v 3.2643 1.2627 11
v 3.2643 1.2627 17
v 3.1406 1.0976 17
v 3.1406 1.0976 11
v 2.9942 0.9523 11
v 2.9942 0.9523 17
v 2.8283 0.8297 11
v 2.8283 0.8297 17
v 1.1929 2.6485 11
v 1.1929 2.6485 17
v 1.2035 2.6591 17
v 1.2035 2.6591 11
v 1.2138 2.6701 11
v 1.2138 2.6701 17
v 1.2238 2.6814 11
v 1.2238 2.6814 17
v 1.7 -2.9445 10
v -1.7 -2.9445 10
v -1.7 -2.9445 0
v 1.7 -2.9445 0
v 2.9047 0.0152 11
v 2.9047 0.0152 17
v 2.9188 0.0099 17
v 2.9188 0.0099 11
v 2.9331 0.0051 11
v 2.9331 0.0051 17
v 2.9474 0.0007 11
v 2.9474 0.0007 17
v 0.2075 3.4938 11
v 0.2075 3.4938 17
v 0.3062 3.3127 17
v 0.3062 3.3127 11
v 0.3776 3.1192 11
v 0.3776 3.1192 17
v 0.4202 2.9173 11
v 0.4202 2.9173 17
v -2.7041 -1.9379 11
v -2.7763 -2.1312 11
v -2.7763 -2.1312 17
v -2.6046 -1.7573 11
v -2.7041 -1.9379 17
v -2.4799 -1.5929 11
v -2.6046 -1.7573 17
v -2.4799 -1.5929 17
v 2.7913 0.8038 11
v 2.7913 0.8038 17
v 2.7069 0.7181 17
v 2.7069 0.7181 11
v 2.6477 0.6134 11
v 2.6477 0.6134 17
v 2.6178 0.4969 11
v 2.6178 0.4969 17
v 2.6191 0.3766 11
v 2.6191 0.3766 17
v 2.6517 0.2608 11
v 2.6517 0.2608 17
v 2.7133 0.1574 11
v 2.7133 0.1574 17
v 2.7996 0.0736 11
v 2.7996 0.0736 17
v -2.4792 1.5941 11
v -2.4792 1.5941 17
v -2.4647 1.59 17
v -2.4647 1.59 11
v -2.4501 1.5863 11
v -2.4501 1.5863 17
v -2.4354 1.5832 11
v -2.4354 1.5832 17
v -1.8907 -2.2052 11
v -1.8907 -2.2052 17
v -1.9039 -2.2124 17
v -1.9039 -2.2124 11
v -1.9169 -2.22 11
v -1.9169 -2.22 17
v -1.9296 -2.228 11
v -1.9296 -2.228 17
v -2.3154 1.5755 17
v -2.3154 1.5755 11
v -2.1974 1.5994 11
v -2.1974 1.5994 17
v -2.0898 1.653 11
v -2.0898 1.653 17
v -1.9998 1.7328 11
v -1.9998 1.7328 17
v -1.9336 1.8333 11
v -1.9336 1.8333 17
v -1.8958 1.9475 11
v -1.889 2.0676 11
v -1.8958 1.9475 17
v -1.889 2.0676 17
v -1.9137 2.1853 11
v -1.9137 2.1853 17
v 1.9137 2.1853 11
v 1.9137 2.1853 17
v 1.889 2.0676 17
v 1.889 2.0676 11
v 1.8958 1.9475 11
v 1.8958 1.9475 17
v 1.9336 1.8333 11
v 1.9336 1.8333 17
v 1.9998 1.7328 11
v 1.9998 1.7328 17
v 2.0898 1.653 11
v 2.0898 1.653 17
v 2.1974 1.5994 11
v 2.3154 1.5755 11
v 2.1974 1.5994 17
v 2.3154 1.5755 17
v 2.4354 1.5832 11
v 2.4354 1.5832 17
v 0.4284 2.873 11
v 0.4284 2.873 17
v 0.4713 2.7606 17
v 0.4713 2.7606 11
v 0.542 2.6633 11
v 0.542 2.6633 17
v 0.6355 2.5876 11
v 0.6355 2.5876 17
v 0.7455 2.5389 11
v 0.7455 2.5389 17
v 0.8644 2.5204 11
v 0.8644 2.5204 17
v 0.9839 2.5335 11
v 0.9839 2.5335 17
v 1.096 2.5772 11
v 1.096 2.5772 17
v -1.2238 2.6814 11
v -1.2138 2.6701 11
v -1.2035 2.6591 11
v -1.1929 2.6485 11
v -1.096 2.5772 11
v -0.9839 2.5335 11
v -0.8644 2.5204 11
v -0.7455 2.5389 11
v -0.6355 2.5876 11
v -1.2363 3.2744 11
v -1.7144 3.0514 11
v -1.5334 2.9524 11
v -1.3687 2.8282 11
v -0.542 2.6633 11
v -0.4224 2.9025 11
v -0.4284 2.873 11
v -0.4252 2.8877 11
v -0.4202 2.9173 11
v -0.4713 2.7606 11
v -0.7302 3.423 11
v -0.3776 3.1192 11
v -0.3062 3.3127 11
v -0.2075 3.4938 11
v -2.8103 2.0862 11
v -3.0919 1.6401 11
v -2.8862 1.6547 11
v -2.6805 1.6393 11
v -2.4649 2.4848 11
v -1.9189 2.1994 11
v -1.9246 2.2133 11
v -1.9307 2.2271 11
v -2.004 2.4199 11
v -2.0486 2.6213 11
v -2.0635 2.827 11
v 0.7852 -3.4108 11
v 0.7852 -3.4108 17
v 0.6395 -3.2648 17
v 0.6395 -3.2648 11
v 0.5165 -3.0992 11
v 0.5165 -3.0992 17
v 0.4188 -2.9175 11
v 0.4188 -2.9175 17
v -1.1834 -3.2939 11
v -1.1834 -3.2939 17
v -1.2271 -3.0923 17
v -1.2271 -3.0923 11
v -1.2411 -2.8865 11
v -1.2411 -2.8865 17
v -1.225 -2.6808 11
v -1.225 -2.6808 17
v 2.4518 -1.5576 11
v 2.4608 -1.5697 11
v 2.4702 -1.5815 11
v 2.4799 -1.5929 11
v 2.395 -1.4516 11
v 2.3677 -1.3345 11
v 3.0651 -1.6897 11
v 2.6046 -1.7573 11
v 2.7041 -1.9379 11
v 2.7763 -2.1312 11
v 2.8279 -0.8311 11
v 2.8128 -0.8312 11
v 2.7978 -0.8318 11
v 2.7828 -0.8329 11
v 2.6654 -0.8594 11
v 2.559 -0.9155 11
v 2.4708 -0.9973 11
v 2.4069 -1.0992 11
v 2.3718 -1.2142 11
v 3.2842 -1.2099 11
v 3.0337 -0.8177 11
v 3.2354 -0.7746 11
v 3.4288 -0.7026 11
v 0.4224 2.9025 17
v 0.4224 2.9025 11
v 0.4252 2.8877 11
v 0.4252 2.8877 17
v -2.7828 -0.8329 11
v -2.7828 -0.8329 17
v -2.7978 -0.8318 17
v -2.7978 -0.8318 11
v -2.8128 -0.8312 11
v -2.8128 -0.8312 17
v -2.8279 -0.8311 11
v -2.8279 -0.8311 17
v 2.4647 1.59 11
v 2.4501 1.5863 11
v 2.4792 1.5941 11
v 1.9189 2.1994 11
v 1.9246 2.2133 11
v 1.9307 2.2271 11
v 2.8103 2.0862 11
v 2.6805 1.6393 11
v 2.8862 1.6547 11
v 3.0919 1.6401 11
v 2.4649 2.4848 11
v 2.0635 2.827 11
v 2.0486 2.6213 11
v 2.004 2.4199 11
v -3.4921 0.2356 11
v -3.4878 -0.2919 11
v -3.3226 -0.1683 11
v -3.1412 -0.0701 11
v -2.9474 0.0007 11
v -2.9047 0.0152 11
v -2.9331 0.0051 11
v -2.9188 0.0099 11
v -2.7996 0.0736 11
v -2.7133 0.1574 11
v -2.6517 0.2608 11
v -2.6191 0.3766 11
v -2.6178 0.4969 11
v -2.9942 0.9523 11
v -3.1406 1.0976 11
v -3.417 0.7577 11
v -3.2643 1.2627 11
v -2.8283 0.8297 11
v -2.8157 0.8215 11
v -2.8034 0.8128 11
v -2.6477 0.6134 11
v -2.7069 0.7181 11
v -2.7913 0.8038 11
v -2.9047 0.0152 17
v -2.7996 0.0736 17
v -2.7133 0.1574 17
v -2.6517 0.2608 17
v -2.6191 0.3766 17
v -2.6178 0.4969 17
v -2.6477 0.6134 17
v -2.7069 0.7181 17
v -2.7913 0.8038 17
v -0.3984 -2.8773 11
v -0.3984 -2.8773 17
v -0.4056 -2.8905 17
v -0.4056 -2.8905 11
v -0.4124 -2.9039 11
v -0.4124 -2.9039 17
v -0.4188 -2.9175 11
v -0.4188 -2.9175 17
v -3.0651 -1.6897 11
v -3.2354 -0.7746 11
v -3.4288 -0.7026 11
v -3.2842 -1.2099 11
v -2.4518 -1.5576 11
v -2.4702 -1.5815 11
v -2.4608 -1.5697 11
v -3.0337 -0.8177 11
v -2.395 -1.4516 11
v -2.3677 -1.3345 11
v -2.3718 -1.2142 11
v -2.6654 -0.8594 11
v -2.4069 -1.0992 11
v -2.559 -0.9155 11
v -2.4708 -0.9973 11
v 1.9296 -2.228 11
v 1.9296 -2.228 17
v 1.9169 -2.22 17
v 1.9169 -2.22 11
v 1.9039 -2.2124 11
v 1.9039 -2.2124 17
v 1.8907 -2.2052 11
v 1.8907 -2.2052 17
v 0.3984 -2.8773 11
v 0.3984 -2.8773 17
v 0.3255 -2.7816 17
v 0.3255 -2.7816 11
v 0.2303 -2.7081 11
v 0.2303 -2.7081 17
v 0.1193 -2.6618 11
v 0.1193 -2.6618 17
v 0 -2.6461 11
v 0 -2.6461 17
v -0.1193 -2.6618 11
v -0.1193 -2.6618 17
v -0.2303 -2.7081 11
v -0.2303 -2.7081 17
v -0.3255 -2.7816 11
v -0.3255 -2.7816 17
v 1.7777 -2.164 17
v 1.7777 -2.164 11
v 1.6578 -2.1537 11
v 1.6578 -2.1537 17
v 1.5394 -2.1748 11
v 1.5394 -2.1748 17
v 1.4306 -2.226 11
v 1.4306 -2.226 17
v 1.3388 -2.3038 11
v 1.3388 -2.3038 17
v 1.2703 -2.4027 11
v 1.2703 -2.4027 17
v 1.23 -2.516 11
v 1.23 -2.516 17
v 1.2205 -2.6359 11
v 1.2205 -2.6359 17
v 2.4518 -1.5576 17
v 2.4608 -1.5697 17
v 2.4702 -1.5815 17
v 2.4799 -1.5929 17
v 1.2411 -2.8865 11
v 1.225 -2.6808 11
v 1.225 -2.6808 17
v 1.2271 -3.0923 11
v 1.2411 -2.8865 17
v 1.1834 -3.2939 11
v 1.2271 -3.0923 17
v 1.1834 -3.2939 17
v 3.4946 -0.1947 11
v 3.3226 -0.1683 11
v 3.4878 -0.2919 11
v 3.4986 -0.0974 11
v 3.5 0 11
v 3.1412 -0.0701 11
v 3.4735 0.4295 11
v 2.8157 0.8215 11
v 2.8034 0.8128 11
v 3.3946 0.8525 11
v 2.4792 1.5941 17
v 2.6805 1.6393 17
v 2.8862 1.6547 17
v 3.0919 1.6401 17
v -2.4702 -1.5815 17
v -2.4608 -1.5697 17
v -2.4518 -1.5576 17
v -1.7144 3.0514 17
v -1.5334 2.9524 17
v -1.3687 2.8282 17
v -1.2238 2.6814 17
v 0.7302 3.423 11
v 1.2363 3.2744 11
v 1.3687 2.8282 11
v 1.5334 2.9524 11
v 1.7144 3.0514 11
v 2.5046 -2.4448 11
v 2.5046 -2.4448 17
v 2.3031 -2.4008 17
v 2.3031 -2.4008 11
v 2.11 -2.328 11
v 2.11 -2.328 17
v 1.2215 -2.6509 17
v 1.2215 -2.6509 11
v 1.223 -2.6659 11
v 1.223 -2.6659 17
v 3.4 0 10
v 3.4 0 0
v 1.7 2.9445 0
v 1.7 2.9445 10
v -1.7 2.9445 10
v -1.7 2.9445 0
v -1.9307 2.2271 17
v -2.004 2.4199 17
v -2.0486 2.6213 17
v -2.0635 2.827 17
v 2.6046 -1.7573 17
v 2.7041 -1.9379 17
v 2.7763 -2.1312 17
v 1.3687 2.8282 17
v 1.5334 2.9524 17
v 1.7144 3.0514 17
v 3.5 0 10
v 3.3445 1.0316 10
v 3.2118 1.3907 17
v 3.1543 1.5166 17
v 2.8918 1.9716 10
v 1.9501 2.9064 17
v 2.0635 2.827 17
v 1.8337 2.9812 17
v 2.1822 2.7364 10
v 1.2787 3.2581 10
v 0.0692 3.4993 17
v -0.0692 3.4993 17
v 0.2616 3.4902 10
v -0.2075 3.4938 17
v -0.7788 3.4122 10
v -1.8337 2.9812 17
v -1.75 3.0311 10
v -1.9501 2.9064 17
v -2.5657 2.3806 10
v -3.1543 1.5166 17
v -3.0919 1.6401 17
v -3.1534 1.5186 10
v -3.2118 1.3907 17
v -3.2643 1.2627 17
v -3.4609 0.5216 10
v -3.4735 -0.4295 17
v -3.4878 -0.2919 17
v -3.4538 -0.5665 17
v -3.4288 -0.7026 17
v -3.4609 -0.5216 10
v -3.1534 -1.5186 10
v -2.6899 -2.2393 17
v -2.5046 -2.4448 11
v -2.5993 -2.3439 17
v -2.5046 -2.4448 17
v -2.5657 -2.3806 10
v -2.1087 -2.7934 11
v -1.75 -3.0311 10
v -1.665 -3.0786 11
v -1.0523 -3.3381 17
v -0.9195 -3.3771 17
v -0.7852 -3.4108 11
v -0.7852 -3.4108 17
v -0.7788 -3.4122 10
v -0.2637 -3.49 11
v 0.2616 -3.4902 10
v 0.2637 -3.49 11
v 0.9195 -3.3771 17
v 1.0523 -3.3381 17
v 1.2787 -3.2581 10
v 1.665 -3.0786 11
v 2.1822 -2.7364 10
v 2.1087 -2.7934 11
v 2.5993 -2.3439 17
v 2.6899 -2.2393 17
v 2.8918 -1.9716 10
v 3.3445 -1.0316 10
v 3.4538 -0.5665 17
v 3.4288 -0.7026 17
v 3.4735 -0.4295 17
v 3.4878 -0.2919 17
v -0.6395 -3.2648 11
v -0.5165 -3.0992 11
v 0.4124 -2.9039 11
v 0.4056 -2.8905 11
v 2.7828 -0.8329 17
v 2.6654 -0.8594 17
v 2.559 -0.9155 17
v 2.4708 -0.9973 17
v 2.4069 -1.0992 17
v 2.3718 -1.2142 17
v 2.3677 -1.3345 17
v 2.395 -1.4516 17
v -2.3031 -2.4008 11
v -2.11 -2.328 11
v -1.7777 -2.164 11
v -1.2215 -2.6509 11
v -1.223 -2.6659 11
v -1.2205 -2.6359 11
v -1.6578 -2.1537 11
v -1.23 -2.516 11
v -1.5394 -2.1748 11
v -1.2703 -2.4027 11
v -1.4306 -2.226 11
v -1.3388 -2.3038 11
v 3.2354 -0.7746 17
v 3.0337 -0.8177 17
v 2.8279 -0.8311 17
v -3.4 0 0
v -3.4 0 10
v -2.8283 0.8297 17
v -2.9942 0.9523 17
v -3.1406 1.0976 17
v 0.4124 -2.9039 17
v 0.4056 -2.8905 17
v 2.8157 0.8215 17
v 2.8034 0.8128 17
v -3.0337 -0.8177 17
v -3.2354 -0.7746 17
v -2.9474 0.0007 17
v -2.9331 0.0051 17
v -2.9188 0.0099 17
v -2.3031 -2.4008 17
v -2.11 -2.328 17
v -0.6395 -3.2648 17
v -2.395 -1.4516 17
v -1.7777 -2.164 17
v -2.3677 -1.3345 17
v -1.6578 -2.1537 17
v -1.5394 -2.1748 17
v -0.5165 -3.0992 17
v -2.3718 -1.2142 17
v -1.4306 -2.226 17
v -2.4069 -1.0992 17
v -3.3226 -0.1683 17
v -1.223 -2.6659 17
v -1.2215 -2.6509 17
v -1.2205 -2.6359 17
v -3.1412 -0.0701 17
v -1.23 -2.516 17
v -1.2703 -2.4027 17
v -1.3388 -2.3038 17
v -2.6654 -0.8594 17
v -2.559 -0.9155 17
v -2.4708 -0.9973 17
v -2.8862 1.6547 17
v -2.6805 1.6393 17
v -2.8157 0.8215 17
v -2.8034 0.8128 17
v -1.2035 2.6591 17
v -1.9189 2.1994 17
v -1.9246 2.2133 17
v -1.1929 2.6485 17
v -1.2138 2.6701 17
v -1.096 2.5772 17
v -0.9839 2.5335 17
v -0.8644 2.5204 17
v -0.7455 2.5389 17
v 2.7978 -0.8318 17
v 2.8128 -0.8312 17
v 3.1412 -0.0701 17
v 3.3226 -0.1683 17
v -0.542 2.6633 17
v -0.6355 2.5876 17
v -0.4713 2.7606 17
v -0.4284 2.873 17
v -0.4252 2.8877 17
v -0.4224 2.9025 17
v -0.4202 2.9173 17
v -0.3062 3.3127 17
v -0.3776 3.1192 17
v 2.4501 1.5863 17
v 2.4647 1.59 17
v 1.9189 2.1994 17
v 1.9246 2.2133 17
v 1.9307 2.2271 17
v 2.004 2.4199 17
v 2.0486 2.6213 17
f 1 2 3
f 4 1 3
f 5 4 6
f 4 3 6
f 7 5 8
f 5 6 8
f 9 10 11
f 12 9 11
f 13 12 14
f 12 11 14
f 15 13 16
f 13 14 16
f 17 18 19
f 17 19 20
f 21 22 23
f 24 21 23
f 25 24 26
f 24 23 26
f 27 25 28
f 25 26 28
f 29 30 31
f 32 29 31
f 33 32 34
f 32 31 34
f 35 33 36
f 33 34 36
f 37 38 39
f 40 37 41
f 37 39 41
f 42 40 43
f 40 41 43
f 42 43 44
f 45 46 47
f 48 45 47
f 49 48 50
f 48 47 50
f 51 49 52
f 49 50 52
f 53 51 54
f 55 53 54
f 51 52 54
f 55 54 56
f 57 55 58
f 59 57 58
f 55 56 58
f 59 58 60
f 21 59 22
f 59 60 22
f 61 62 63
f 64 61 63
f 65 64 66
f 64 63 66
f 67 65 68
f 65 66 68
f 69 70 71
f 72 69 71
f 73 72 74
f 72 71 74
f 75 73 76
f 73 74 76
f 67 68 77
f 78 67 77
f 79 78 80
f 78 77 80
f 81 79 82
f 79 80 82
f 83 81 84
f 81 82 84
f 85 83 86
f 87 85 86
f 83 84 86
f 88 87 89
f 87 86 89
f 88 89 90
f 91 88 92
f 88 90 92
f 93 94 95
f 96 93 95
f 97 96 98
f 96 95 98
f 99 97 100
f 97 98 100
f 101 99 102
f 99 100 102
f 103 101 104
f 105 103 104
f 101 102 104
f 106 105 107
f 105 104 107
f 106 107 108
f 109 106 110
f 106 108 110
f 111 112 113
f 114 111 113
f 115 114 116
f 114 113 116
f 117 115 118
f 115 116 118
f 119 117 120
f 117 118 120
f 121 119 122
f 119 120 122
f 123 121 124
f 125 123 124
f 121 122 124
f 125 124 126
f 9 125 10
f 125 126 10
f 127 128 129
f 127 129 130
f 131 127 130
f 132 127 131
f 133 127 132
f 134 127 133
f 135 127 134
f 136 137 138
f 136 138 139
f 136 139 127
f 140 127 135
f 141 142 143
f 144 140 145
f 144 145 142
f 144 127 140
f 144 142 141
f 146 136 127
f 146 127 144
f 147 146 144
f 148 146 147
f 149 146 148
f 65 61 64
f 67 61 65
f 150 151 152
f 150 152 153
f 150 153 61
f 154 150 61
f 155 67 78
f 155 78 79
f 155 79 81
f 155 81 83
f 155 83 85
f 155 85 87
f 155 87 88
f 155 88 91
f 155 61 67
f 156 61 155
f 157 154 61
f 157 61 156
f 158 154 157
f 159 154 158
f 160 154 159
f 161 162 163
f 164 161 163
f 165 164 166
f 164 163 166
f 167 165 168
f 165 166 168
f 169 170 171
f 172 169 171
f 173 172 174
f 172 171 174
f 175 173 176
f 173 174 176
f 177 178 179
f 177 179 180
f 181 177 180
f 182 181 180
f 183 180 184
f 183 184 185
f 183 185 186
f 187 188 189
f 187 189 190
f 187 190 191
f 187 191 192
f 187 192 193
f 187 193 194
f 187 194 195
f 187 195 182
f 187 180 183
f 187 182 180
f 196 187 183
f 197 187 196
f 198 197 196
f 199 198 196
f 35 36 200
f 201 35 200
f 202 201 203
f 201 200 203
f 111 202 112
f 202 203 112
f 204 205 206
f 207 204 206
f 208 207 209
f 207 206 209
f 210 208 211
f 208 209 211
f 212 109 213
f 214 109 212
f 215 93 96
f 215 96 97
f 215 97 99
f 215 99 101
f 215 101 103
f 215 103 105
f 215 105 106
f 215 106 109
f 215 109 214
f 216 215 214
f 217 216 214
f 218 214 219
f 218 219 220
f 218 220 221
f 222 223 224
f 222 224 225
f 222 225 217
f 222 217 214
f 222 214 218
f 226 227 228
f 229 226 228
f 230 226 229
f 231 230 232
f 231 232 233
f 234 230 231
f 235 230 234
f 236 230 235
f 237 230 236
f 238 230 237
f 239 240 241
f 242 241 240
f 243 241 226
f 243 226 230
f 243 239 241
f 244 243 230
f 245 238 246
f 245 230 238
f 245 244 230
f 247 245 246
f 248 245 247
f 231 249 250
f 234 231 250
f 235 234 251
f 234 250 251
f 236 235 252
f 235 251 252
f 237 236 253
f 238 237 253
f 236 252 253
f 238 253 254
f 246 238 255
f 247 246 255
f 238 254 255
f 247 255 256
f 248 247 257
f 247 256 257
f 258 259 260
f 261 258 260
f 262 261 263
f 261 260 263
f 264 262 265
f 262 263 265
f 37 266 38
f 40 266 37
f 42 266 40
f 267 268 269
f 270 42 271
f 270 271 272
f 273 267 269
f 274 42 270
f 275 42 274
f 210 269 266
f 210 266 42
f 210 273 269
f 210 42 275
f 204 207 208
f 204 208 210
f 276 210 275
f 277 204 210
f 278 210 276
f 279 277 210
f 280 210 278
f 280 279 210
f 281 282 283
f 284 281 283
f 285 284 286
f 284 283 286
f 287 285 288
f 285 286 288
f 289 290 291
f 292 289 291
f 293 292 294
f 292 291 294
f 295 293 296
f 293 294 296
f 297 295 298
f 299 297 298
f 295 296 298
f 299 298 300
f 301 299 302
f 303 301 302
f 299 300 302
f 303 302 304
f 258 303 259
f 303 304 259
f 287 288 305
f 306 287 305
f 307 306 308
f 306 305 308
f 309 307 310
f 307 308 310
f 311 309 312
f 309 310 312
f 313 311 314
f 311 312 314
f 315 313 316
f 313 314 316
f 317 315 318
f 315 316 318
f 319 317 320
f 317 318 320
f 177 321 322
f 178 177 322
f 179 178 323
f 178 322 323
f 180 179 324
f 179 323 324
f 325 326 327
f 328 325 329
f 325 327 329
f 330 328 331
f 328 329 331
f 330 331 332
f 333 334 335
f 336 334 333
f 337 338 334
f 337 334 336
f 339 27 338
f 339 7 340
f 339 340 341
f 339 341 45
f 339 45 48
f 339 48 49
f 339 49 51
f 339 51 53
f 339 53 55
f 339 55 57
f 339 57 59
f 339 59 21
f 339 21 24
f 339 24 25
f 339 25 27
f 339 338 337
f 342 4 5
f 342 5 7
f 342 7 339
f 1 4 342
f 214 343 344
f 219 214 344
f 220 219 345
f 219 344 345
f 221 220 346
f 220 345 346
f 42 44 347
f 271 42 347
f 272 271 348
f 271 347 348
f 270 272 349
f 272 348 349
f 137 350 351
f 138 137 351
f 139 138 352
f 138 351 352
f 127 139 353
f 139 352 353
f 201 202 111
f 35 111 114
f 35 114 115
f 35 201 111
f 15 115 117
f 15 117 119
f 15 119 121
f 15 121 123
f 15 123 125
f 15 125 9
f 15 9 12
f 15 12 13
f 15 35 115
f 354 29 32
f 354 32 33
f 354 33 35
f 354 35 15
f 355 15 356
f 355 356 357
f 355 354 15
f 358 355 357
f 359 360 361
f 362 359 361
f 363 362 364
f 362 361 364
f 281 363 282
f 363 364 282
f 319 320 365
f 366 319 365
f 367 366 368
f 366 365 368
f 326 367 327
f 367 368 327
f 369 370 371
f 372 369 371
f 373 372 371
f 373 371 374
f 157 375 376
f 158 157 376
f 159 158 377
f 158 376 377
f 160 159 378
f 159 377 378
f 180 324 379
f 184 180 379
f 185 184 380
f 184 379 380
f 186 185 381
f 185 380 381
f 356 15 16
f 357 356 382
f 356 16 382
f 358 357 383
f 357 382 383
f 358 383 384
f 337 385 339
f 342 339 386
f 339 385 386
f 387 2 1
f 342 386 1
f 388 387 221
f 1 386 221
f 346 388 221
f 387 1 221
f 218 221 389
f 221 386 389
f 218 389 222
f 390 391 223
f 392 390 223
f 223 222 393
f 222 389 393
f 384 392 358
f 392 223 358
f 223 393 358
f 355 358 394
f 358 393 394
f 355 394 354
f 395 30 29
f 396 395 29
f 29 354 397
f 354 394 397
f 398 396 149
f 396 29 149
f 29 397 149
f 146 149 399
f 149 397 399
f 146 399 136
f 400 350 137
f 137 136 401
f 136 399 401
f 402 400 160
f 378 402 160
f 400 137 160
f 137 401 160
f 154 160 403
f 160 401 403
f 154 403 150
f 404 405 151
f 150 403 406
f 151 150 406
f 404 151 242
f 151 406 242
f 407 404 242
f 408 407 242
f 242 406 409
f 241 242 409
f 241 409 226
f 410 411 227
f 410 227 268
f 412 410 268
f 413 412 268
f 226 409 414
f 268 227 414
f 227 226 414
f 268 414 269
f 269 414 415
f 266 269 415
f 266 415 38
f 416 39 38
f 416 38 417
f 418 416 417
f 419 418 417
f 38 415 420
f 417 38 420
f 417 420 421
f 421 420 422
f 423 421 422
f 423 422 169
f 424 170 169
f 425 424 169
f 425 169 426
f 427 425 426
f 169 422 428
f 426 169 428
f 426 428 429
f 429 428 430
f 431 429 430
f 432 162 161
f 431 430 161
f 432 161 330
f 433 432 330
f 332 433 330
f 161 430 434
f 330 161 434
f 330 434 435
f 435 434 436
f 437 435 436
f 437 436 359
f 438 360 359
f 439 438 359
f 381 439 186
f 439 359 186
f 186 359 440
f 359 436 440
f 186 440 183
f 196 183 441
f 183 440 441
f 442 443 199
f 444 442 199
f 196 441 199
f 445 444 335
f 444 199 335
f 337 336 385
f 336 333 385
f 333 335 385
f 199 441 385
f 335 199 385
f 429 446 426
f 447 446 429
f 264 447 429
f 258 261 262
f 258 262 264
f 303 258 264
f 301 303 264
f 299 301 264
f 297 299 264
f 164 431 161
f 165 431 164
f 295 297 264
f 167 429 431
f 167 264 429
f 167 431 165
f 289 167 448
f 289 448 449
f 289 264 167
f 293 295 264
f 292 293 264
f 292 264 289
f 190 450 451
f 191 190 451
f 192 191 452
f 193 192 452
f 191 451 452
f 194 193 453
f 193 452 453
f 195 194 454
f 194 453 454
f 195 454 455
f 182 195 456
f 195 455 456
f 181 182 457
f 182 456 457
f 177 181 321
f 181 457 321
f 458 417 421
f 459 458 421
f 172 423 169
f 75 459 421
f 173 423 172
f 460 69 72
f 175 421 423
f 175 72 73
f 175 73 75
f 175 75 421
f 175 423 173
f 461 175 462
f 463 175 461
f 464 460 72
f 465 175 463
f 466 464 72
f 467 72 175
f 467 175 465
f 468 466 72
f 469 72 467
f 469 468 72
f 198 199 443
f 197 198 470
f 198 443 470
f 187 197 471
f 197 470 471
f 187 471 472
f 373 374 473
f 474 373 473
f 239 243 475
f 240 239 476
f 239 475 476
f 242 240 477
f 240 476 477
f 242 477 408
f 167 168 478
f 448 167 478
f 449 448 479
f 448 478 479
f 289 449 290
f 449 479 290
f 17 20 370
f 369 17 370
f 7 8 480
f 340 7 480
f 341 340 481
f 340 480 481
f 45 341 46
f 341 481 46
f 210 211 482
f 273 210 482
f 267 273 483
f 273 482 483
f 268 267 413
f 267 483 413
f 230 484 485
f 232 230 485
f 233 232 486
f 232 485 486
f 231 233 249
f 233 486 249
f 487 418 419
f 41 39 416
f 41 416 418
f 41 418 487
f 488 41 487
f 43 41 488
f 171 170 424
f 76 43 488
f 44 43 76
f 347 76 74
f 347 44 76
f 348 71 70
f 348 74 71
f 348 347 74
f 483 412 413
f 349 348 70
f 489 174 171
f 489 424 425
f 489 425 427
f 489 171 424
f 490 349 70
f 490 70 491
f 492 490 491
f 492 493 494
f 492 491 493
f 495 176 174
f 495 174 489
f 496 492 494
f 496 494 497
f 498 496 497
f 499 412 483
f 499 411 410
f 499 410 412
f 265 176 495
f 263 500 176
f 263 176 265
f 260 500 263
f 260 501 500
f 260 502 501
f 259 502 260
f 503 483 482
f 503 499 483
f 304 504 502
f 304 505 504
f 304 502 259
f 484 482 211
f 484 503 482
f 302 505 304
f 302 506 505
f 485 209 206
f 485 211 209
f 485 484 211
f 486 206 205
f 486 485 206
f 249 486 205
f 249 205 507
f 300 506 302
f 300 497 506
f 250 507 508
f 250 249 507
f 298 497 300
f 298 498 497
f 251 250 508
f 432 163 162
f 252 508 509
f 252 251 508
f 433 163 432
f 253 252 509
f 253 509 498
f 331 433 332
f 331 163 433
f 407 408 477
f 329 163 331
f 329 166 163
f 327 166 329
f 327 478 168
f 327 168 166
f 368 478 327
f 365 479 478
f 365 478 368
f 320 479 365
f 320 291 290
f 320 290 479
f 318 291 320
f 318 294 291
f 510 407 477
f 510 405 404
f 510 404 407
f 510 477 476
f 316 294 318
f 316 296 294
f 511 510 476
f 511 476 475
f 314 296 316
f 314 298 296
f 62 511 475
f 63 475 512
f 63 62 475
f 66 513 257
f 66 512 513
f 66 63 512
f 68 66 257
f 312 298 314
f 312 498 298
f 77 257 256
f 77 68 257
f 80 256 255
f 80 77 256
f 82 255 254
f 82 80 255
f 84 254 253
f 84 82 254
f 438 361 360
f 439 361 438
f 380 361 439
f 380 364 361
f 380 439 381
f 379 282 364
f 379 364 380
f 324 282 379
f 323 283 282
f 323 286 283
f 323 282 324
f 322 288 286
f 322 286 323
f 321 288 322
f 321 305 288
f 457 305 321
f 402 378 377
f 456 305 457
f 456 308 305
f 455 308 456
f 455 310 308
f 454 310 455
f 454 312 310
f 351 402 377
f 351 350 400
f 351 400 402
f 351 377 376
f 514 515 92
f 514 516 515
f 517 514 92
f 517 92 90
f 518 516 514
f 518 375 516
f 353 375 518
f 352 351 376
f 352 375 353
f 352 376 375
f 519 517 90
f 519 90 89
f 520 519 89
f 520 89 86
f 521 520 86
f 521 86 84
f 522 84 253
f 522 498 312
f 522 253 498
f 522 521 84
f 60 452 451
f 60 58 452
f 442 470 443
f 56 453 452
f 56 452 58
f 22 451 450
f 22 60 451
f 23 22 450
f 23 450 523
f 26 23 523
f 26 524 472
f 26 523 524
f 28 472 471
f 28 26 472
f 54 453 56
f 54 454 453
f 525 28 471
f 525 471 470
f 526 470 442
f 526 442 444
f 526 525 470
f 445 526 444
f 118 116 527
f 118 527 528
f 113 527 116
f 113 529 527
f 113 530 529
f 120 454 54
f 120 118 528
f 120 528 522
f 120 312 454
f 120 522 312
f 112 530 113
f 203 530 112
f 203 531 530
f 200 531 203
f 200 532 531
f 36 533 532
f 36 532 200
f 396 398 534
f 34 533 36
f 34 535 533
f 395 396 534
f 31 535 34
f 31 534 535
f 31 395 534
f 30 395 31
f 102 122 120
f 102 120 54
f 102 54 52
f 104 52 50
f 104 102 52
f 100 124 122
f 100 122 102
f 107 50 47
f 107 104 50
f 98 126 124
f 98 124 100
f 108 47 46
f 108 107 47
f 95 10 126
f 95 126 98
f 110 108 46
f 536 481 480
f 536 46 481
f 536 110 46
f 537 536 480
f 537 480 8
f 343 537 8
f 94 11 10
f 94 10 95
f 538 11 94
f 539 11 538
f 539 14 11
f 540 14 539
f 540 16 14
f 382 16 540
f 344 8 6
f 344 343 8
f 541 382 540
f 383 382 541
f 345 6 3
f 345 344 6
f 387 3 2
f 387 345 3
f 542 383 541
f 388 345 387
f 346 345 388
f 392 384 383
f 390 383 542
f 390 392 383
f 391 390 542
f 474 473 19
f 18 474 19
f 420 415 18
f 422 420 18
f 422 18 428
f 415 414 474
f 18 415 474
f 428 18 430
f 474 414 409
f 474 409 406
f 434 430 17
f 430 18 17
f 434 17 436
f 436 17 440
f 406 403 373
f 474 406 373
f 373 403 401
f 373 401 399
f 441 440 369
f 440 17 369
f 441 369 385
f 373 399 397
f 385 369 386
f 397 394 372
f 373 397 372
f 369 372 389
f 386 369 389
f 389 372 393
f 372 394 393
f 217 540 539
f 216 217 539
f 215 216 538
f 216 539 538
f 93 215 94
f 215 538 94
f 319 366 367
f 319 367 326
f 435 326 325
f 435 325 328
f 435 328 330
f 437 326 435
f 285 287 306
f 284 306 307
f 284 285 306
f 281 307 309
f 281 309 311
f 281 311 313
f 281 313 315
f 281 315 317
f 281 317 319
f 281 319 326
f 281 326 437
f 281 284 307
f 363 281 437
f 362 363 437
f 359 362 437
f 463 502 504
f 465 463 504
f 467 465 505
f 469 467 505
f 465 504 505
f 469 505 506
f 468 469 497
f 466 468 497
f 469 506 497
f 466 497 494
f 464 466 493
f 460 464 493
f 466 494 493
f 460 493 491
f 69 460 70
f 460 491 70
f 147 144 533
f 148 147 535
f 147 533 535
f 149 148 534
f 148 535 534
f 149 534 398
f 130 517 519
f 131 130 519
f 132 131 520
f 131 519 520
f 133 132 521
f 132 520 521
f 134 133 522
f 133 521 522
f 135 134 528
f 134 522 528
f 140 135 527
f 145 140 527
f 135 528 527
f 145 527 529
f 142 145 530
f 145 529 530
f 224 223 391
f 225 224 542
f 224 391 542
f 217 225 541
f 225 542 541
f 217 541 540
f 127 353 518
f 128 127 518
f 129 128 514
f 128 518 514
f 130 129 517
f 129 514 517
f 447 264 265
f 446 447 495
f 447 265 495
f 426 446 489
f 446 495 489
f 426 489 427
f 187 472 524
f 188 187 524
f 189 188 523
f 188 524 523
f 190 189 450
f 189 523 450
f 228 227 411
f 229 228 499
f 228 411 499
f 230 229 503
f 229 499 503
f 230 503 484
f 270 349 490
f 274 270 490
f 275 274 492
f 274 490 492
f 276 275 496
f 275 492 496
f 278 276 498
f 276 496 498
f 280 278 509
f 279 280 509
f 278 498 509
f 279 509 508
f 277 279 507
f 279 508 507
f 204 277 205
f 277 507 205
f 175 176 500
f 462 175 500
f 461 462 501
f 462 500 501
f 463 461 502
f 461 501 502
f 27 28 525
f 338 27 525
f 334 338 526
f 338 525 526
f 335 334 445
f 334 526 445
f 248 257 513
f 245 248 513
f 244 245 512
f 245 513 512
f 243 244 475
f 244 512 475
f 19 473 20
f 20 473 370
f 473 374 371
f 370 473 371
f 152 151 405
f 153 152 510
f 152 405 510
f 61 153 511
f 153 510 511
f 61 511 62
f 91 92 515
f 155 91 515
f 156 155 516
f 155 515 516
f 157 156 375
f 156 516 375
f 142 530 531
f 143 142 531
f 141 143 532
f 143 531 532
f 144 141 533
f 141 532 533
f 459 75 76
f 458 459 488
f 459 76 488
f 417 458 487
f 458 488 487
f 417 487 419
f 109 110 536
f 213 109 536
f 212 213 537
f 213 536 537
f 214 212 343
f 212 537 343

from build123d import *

# Parameters (mm, degrees)
BOSS_EXTRUDE1_DEPTH = 10
SKETCH2_R           = 3.5
BOSS_EXTRUDE2_DEPTH = 7
SKETCH5_OUTSIDE_W   = 12.934
SKETCH5_OUTSIDE_H   = 12.934
CUT_EXTRUDE1_DEPTH  = 6


with BuildPart() as part:
    # Sketch1 → Boss-Extrude1 (new body)
    with BuildSketch(Plane.XY):
        Polygon((3.4, 0), (1.7, 2.944486373), (-1.7, 2.944486373), (-3.4, 0), (-1.7, -2.944486373), (1.7, -2.944486373), align=None)
    extrude(amount=BOSS_EXTRUDE1_DEPTH)

    # Sketch2 → Boss-Extrude2 (add)
    with BuildSketch(Plane.XY.offset(10)):
        Circle(SKETCH2_R)
    extrude(amount=BOSS_EXTRUDE2_DEPTH)

    # Sketch5 outside → Cut-Extrude1 (cut)
    with BuildSketch(Plane.XY.offset(17)):
        Rectangle(SKETCH5_OUTSIDE_W, SKETCH5_OUTSIDE_H)
        with BuildLine():
            ThreePointArc((-1.225048855, -2.680805064), (-1.222210326, -2.658421079), (-1.220475879, -2.635924597))
            ThreePointArc((-1.220475879, -2.635924597), (-1.430570177, -2.226010646), (-1.890717348, -2.20518656))
            ThreePointArc((-1.890717348, -2.20518656), (-1.910460352, -2.216109645), (-1.929642373, -2.227990304))
            ThreePointArc((-1.929642373, -2.227990304), (-2.205665987, -2.368094557), (-2.505525497, -2.444922359))
            ThreePointArc((-2.505525497, -2.444922359), (-2.645696022, -2.292508653), (-2.776610031, -2.13207413))
            ThreePointArc((-2.776610031, -2.13207413), (-2.657889767, -1.846200494), (-2.479929318, -1.592925316))
            ThreePointArc((-2.479929318, -1.592925316), (-2.4654397, -1.575629335), (-2.451818074, -1.557641803))
            ThreePointArc((-2.451818074, -1.557641803), (-2.40694443, -1.09921469), (-2.782786513, -0.832922011))
            ThreePointArc((-2.782786513, -0.832922011), (-2.80530085, -0.831437221), (-2.827860963, -0.831061285))
            ThreePointArc((-2.827860963, -0.831061285), (-3.135812881, -0.79969485), (-3.429606999, -0.702210219))
            ThreePointArc((-3.429606999, -0.702210219), (-3.465124877, -0.498209743), (-3.488519299, -0.292466177))
            ThreePointArc((-3.488519299, -0.292466177), (-3.234090501, -0.116158991), (-2.947449745, 0.000696964))
            ThreePointArc((-2.947449745, 0.000696964), (-2.925909389, 0.00741359), (-2.904725354, 0.015181258))
            ThreePointArc((-2.904725354, 0.015181258), (-2.619130834, 0.376574163), (-2.791340622, 0.80378939))
            ThreePointArc((-2.791340622, 0.80378939), (-2.80947815, 0.817210645), (-2.828253678, 0.829723821))
            ThreePointArc((-2.828253678, 0.829723821), (-3.070361342, 1.022602322), (-3.264812511, 1.263448704))
            ThreePointArc((-3.264812511, 1.263448704), (-3.184401067, 1.454267239), (-3.092848337, 1.63999772))
            ThreePointArc((-3.092848337, 1.63999772), (-2.783490351, 1.65076217), (-2.479175704, 1.594097963))
            ThreePointArc((-2.479175704, 1.594097963), (-2.457423521, 1.588102753), (-2.435402858, 1.583184377))
            ThreePointArc((-2.435402858, 1.583184377), (-1.999761704, 1.73280338), (-1.913663807, 2.18530334))
            ThreePointArc((-1.913663807, 2.18530334), (-1.921665988, 2.206399906), (-1.930695833, 2.227077476))
            ThreePointArc((-1.930695833, 2.227077476), (-2.030091771, 2.520230481), (-2.063463119, 2.82797159))
            ThreePointArc((-2.063463119, 2.82797159), (-1.892652419, 2.945024649), (-1.715219882, 3.051773929))
            ThreePointArc((-1.715219882, 3.051773929), (-1.449151682, 2.893578006), (-1.223780893, 2.681384122))
            ThreePointArc((-1.223780893, 2.681384122), (-1.208723048, 2.664580512), (-1.192857163, 2.648537642))
            ThreePointArc((-1.192857163, 2.648537642), (-0.745482362, 2.538879767), (-0.428412254, 2.87299892))
            ThreePointArc((-0.428412254, 2.87299892), (-0.423738452, 2.895072786), (-0.420155704, 2.917349768))
            ThreePointArc((-0.420155704, 2.917349768), (-0.345282406, 3.217703271), (-0.206978766, 3.494633479))
            ThreePointArc((-0.206978766, 3.494633479), (-0.103534673, 3.499226191), (0, 3.500757541))
            ThreePointArc((0, 3.500757541), (0.103534673, 3.499226191), (0.206978766, 3.494633479))
            ThreePointArc((0.206978766, 3.494633479), (0.345282406, 3.217703271), (0.420155704, 2.917349768))
            ThreePointArc((0.420155704, 2.917349768), (0.423738452, 2.895072786), (0.428412254, 2.87299892))
            ThreePointArc((0.428412254, 2.87299892), (0.745482362, 2.538879767), (1.192857163, 2.648537642))
            ThreePointArc((1.192857163, 2.648537642), (1.208723048, 2.664580512), (1.223780893, 2.681384122))
            ThreePointArc((1.223780893, 2.681384122), (1.449151682, 2.893578006), (1.715219882, 3.051773929))
            ThreePointArc((1.715219882, 3.051773929), (1.892652419, 2.945024649), (2.063463119, 2.82797159))
            ThreePointArc((2.063463119, 2.82797159), (2.030091771, 2.520230481), (1.930695833, 2.227077476))
            ThreePointArc((1.930695833, 2.227077476), (1.921665988, 2.206399906), (1.913663807, 2.18530334))
            ThreePointArc((1.913663807, 2.18530334), (1.999761704, 1.73280338), (2.435402858, 1.583184377))
            ThreePointArc((2.435402858, 1.583184377), (2.457423521, 1.588102753), (2.479175704, 1.594097963))
            ThreePointArc((2.479175704, 1.594097963), (2.783490351, 1.65076217), (3.092848337, 1.63999772))
            ThreePointArc((3.092848337, 1.63999772), (3.184401067, 1.454267239), (3.264812511, 1.263448704))
            ThreePointArc((3.264812511, 1.263448704), (3.070361342, 1.022602322), (2.828253678, 0.829723821))
            ThreePointArc((2.828253678, 0.829723821), (2.80947815, 0.817210645), (2.791340622, 0.80378939))
            ThreePointArc((2.791340622, 0.80378939), (2.619130834, 0.376574163), (2.904725354, 0.015181258))
            ThreePointArc((2.904725354, 0.015181258), (2.925909389, 0.00741359), (2.947449745, 0.000696964))
            ThreePointArc((2.947449745, 0.000696964), (3.234090501, -0.116158991), (3.488519299, -0.292466177))
            ThreePointArc((3.488519299, -0.292466177), (3.465124877, -0.498209743), (3.429606999, -0.702210219))
            ThreePointArc((3.429606999, -0.702210219), (3.135812881, -0.79969485), (2.827860963, -0.831061285))
            ThreePointArc((2.827860963, -0.831061285), (2.80530085, -0.831437221), (2.782786513, -0.832922011))
            ThreePointArc((2.782786513, -0.832922011), (2.40694443, -1.09921469), (2.451818074, -1.557641803))
            ThreePointArc((2.451818074, -1.557641803), (2.4654397, -1.575629335), (2.479929318, -1.592925316))
            ThreePointArc((2.479929318, -1.592925316), (2.657889767, -1.846200494), (2.776610031, -2.13207413))
            ThreePointArc((2.776610031, -2.13207413), (2.645696022, -2.292508653), (2.505525497, -2.444922359))
            ThreePointArc((2.505525497, -2.444922359), (2.205665989, -2.368094556), (1.929642376, -2.227990303))
            ThreePointArc((1.929642376, -2.227990303), (1.910460355, -2.216109643), (1.890717351, -2.205186558))
            ThreePointArc((1.890717351, -2.205186558), (1.430570178, -2.226010644), (1.220475879, -2.635924598))
            ThreePointArc((1.220475879, -2.635924598), (1.222210326, -2.65842108), (1.225048855, -2.680805065))
            ThreePointArc((1.225048855, -2.680805065), (1.237827812, -2.990086385), (1.183146697, -3.294763611))
            ThreePointArc((1.183146697, -3.294763611), (0.986277373, -3.358952263), (0.785957353, -3.411388925))
            ThreePointArc((0.785957353, -3.411388925), (0.575235727, -3.184640974), (0.418775964, -2.917548145))
            ThreePointArc((0.418775964, -2.917548145), (0.409062191, -2.897182914), (0.398358784, -2.877319957))
            ThreePointArc((0.398358784, -2.877319957), (0, -2.646063949), (-0.398358784, -2.877319956))
            ThreePointArc((-0.398358784, -2.877319956), (-0.409062191, -2.897182914), (-0.418775964, -2.917548145))
            ThreePointArc((-0.418775964, -2.917548145), (-0.575235727, -3.184640974), (-0.785957353, -3.411388925))
            ThreePointArc((-0.785957353, -3.411388925), (-0.986277373, -3.358952263), (-1.183146697, -3.294763611))
            ThreePointArc((-1.183146697, -3.294763611), (-1.237827813, -2.990086384), (-1.225048855, -2.680805064))
        make_face(mode=Mode.SUBTRACT)
    extrude(amount=-CUT_EXTRUDE1_DEPTH, mode=Mode.SUBTRACT)


solid = part.part
